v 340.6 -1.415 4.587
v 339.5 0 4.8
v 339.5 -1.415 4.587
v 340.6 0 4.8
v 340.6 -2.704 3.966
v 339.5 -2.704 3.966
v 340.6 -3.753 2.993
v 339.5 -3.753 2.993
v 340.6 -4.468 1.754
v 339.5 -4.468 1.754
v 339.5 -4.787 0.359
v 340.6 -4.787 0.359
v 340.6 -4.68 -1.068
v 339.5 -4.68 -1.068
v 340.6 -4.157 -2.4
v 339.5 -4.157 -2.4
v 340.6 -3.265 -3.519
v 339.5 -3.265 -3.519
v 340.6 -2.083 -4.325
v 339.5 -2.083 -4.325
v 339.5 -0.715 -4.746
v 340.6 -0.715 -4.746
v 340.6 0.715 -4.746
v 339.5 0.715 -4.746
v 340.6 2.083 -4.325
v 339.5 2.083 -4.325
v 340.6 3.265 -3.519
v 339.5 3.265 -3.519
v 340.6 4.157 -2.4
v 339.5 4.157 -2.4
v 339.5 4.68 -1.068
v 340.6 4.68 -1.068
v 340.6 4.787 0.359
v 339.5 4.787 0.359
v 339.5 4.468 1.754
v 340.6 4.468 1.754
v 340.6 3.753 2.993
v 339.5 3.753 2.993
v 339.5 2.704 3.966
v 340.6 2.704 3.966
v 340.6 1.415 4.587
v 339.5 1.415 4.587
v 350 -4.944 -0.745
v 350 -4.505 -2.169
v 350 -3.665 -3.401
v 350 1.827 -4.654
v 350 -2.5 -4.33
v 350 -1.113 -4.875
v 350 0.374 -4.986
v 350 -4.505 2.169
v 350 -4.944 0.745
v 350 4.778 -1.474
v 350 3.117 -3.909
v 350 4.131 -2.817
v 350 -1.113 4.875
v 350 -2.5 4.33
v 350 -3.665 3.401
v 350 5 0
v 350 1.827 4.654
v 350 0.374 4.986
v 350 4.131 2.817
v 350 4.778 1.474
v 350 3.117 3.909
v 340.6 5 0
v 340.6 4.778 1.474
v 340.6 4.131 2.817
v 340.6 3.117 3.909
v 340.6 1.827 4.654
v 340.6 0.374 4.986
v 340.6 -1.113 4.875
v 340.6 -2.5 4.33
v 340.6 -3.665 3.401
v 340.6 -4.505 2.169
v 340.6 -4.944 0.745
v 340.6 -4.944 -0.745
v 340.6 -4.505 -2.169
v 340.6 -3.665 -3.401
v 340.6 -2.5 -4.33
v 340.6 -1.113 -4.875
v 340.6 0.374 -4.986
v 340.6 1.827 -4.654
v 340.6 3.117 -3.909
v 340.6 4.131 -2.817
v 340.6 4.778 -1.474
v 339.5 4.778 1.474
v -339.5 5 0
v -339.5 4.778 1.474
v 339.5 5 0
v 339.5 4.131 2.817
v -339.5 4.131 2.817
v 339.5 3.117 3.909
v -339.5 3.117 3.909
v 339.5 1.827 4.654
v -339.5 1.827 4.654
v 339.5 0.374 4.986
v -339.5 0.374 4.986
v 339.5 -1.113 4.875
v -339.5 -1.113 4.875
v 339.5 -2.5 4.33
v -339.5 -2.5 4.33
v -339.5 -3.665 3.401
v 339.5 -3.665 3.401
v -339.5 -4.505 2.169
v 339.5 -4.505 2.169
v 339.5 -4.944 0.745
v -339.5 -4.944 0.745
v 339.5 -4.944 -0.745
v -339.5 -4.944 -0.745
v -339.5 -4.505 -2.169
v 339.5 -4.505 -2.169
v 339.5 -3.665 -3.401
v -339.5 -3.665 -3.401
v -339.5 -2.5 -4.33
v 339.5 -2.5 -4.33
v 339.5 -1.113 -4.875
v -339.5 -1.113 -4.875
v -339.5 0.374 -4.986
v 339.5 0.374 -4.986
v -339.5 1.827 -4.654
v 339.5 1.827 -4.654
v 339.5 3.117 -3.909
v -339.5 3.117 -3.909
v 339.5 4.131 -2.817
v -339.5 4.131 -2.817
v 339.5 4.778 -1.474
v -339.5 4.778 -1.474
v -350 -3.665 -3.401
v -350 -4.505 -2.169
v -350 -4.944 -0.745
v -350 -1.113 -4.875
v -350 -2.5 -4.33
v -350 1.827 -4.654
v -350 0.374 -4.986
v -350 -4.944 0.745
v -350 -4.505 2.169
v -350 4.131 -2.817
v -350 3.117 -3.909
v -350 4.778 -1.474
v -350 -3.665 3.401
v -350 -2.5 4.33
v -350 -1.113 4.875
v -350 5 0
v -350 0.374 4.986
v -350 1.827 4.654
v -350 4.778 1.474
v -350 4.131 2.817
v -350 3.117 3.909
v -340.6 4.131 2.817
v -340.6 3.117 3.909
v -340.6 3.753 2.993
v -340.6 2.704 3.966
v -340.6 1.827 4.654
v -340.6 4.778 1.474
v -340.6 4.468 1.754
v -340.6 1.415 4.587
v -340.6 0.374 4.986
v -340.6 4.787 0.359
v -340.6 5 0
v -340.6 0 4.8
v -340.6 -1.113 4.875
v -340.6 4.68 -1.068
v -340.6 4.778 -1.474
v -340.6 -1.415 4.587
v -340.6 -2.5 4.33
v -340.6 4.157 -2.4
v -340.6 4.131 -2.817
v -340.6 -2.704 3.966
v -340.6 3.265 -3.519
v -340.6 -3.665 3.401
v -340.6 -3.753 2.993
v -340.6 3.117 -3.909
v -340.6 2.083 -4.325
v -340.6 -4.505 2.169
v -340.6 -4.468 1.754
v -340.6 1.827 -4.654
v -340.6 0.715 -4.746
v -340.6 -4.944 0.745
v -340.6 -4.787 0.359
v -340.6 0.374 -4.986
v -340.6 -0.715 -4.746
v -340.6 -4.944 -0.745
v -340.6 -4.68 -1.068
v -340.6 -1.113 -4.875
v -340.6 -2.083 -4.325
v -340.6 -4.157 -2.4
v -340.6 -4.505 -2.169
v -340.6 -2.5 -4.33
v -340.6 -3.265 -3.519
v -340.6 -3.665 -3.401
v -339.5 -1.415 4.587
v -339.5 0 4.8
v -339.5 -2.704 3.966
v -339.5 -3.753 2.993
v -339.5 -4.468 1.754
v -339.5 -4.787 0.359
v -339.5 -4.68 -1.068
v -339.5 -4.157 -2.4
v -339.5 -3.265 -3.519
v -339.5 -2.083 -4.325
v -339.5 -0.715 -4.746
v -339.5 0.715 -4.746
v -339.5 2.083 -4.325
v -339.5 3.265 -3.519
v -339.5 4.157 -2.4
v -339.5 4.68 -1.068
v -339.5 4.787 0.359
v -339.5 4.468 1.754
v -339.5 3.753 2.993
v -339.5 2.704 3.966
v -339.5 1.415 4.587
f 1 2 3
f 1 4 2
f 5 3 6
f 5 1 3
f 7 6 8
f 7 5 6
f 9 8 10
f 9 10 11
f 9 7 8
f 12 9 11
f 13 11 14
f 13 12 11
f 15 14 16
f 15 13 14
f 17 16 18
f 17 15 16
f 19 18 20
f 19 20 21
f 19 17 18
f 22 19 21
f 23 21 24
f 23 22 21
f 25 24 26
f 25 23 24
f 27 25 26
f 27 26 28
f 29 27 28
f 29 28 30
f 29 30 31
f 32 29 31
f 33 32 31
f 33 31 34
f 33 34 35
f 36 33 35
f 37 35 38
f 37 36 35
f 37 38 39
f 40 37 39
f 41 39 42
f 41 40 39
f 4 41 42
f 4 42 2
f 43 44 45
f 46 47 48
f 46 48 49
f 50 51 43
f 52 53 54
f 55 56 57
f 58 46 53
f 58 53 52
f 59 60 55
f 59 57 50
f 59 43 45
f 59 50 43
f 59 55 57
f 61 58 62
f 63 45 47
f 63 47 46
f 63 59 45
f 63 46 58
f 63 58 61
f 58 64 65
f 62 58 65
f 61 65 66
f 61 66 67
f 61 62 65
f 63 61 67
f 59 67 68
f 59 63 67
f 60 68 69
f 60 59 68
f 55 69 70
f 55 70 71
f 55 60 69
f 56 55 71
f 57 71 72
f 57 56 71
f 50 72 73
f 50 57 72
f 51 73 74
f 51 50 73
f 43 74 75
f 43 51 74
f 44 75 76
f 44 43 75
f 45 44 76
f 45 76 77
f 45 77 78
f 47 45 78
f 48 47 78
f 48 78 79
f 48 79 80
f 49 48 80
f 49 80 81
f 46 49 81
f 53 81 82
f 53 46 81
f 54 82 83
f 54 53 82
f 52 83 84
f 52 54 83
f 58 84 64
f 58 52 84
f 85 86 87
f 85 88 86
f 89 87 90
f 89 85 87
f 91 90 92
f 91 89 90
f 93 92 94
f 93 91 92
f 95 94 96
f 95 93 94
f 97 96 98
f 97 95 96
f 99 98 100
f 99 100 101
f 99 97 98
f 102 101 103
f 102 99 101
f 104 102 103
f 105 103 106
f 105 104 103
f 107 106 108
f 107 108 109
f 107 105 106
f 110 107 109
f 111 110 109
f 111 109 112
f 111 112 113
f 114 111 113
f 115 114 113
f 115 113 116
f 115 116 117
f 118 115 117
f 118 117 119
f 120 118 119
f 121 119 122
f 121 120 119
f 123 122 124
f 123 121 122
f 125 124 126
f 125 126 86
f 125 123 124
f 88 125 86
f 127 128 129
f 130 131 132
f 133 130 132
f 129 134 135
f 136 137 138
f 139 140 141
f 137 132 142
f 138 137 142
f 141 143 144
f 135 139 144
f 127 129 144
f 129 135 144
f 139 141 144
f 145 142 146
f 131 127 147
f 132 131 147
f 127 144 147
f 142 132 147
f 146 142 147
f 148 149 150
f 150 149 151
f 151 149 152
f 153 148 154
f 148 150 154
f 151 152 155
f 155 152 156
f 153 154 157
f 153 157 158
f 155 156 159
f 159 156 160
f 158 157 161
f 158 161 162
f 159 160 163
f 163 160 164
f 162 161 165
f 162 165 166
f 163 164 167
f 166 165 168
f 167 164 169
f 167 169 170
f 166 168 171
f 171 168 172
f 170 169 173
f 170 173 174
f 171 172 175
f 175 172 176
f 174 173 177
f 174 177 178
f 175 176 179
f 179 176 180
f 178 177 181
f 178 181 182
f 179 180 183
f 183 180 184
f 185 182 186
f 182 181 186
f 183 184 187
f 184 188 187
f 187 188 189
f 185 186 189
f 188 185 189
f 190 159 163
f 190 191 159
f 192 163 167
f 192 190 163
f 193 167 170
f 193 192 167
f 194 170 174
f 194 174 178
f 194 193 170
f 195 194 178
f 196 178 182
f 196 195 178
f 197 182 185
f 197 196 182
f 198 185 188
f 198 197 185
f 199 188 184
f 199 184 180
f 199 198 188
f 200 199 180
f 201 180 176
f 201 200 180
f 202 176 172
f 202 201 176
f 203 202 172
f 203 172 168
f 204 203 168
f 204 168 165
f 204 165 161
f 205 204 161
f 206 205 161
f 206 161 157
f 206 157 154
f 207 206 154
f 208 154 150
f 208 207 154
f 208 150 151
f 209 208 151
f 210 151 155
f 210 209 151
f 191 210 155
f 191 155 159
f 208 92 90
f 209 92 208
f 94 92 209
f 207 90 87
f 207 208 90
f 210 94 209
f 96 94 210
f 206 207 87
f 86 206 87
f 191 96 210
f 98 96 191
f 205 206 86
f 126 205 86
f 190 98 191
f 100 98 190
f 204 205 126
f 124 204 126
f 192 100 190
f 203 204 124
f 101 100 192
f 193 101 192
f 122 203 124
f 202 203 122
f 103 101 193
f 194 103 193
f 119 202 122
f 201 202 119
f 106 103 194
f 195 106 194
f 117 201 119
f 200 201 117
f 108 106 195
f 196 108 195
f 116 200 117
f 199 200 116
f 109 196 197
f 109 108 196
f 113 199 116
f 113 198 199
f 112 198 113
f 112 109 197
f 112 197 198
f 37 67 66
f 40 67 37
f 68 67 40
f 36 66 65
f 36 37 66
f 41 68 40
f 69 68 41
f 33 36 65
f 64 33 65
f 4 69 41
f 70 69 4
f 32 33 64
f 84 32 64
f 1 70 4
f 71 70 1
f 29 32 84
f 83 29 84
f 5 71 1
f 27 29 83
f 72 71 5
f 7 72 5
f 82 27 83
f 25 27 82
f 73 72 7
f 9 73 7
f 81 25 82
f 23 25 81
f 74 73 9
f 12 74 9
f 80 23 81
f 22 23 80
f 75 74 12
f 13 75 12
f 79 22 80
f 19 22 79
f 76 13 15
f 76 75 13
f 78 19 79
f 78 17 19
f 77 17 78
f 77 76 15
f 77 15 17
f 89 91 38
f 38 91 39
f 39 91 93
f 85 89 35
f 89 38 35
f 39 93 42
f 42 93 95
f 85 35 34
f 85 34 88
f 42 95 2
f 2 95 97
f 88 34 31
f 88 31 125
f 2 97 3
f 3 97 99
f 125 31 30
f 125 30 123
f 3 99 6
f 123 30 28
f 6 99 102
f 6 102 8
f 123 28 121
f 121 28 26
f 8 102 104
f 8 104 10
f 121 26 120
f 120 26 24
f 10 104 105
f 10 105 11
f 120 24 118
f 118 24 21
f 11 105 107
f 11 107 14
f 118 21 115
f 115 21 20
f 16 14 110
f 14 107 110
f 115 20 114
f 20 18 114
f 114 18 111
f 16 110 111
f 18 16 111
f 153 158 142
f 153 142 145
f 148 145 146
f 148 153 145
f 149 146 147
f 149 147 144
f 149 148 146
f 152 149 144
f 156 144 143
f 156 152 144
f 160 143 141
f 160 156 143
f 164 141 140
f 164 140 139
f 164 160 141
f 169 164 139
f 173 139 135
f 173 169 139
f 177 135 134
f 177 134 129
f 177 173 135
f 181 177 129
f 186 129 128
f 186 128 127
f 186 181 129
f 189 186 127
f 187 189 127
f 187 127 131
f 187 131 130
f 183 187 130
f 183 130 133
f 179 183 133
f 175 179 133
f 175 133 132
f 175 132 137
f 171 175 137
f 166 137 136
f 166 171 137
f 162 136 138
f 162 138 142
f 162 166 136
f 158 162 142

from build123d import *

# Parameters (mm, degrees)
F0_R     = 5
F1_DEPTH = 350
F2_W     = 1.1
F2_H     = 1


with BuildPart() as f1:
    # F0 (on Right) → F1 (new body, symmetric)
    with BuildSketch(Plane.YZ):
        Circle(F0_R)
    extrude(amount=F1_DEPTH, both=True)

    # F2 (on Front) → F3 (revolve, cut)
    with BuildSketch(Plane.XZ):
        with Locations((340.05, 5.3)):
            Rectangle(F2_W, F2_H)
        with Locations((-340.05, 5.3)):
            Rectangle(F2_W, F2_H)
    revolve(axis=Axis((186.2977445126, 0, 0), (1, 0, 0)), mode=Mode.SUBTRACT)


solid = f1.part
